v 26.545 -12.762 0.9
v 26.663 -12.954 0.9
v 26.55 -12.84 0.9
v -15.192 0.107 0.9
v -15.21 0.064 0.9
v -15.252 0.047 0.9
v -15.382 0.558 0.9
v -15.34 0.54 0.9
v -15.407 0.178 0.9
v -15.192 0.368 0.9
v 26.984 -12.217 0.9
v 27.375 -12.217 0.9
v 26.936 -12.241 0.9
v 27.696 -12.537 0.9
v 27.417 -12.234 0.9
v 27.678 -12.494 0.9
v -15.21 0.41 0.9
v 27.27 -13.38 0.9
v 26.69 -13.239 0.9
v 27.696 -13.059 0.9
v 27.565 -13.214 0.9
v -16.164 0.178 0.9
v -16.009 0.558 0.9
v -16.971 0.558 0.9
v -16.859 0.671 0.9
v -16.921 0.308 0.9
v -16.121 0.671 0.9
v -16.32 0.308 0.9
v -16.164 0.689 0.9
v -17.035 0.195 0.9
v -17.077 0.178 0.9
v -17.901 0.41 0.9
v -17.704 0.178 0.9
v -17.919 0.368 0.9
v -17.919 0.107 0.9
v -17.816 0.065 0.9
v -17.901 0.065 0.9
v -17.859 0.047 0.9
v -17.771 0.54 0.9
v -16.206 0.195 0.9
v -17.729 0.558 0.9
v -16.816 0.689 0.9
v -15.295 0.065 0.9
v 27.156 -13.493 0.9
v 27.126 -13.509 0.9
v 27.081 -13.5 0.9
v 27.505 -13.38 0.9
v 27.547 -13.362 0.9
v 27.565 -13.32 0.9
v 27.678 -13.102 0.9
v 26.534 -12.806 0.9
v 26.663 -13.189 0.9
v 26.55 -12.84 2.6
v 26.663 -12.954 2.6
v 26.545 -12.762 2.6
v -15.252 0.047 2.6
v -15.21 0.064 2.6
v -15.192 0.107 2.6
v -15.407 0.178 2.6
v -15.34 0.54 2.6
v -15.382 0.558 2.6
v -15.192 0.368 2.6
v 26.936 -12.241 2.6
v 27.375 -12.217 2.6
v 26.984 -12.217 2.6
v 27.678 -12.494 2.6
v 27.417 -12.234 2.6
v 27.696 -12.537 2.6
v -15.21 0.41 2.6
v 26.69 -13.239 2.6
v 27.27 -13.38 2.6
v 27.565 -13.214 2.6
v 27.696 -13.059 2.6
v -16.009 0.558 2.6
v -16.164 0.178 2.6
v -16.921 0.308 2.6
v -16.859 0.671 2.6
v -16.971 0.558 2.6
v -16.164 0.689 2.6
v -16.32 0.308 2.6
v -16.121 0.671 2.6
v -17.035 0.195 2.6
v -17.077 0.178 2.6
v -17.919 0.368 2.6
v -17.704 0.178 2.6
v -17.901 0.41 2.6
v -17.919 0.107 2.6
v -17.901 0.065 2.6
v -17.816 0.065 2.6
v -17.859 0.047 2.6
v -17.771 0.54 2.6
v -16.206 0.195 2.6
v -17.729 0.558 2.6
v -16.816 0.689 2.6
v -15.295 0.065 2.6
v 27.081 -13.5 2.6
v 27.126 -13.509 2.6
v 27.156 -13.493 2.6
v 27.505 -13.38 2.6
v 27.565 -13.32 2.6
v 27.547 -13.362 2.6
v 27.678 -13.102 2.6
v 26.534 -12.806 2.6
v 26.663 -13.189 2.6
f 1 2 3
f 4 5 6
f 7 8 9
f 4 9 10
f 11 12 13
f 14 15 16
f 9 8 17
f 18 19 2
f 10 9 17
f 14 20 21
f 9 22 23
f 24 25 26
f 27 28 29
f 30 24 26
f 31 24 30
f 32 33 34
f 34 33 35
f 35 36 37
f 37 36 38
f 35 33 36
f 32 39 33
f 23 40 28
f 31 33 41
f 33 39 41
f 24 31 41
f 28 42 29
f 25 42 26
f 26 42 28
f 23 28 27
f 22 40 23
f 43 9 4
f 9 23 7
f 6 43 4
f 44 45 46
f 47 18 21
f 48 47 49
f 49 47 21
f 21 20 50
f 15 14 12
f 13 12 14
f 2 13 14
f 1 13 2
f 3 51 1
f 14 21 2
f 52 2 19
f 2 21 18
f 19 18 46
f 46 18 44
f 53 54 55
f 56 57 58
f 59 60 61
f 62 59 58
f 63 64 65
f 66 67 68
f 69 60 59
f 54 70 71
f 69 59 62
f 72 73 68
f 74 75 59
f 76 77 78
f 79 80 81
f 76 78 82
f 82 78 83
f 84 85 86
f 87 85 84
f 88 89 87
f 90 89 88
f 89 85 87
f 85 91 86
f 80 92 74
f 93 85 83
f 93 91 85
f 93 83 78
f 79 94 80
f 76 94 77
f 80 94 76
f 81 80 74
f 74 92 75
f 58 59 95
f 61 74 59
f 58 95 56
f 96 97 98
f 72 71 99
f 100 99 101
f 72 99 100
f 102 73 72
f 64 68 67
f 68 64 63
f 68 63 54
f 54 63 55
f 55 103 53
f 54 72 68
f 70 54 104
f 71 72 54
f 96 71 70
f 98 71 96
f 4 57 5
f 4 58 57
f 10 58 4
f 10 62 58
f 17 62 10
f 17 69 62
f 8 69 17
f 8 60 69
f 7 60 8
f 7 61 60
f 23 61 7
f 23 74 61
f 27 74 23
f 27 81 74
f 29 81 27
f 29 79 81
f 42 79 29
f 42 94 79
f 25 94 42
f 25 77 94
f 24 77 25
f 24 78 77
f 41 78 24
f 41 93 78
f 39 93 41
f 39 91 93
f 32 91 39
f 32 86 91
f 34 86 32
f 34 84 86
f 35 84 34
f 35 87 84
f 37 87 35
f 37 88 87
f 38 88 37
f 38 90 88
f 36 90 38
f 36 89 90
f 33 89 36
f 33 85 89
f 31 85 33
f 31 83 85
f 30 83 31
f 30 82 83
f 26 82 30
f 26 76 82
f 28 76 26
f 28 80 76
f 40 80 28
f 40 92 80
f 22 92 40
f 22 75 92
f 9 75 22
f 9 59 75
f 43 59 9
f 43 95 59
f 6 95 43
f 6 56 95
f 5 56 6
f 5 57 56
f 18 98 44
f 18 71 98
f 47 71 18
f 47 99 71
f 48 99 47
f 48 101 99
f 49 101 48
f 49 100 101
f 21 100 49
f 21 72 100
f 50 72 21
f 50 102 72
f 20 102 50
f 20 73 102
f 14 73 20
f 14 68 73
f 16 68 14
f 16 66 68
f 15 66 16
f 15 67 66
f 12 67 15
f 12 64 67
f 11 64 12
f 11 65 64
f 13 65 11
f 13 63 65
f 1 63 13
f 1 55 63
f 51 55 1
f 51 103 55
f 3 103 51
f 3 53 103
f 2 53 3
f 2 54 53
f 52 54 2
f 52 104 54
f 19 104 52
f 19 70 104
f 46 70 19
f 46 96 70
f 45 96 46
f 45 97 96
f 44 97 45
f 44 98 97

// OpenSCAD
$fn = 24;
translate([0, -2.500, 0.900])
  linear_extrude(height=1.700) {
offset(r=0.06, $fn=8) {
    polygon(points=[[27.375,-9.777],[26.984,-9.777],[26.593,-10.298],[26.723,-10.429],[26.723,-10.689],[27.114,-10.950],[27.245,-10.820],[27.505,-10.820],[27.505,-10.689],[27.636,-10.559],[27.636,-10.037]], paths=[[0,1,2,3,4,5,6,7,8,9,10]]);
    polygon(points=[[-17.859,2.868],[-17.859,2.607],[-17.729,2.738],[-17.077,2.738],[-16.946,2.868],[-16.295,2.868],[-16.164,2.738],[-15.382,2.738],[-15.252,2.607],[-15.252,2.868],[-15.382,2.998],[-16.034,2.998],[-16.164,3.129],[-16.816,3.129],[-16.946,2.998],[-17.729,2.998]], paths=[[0,1,2,3,4,5,6,7,8,9,10,11,12,13,14,15]]);
}
}
